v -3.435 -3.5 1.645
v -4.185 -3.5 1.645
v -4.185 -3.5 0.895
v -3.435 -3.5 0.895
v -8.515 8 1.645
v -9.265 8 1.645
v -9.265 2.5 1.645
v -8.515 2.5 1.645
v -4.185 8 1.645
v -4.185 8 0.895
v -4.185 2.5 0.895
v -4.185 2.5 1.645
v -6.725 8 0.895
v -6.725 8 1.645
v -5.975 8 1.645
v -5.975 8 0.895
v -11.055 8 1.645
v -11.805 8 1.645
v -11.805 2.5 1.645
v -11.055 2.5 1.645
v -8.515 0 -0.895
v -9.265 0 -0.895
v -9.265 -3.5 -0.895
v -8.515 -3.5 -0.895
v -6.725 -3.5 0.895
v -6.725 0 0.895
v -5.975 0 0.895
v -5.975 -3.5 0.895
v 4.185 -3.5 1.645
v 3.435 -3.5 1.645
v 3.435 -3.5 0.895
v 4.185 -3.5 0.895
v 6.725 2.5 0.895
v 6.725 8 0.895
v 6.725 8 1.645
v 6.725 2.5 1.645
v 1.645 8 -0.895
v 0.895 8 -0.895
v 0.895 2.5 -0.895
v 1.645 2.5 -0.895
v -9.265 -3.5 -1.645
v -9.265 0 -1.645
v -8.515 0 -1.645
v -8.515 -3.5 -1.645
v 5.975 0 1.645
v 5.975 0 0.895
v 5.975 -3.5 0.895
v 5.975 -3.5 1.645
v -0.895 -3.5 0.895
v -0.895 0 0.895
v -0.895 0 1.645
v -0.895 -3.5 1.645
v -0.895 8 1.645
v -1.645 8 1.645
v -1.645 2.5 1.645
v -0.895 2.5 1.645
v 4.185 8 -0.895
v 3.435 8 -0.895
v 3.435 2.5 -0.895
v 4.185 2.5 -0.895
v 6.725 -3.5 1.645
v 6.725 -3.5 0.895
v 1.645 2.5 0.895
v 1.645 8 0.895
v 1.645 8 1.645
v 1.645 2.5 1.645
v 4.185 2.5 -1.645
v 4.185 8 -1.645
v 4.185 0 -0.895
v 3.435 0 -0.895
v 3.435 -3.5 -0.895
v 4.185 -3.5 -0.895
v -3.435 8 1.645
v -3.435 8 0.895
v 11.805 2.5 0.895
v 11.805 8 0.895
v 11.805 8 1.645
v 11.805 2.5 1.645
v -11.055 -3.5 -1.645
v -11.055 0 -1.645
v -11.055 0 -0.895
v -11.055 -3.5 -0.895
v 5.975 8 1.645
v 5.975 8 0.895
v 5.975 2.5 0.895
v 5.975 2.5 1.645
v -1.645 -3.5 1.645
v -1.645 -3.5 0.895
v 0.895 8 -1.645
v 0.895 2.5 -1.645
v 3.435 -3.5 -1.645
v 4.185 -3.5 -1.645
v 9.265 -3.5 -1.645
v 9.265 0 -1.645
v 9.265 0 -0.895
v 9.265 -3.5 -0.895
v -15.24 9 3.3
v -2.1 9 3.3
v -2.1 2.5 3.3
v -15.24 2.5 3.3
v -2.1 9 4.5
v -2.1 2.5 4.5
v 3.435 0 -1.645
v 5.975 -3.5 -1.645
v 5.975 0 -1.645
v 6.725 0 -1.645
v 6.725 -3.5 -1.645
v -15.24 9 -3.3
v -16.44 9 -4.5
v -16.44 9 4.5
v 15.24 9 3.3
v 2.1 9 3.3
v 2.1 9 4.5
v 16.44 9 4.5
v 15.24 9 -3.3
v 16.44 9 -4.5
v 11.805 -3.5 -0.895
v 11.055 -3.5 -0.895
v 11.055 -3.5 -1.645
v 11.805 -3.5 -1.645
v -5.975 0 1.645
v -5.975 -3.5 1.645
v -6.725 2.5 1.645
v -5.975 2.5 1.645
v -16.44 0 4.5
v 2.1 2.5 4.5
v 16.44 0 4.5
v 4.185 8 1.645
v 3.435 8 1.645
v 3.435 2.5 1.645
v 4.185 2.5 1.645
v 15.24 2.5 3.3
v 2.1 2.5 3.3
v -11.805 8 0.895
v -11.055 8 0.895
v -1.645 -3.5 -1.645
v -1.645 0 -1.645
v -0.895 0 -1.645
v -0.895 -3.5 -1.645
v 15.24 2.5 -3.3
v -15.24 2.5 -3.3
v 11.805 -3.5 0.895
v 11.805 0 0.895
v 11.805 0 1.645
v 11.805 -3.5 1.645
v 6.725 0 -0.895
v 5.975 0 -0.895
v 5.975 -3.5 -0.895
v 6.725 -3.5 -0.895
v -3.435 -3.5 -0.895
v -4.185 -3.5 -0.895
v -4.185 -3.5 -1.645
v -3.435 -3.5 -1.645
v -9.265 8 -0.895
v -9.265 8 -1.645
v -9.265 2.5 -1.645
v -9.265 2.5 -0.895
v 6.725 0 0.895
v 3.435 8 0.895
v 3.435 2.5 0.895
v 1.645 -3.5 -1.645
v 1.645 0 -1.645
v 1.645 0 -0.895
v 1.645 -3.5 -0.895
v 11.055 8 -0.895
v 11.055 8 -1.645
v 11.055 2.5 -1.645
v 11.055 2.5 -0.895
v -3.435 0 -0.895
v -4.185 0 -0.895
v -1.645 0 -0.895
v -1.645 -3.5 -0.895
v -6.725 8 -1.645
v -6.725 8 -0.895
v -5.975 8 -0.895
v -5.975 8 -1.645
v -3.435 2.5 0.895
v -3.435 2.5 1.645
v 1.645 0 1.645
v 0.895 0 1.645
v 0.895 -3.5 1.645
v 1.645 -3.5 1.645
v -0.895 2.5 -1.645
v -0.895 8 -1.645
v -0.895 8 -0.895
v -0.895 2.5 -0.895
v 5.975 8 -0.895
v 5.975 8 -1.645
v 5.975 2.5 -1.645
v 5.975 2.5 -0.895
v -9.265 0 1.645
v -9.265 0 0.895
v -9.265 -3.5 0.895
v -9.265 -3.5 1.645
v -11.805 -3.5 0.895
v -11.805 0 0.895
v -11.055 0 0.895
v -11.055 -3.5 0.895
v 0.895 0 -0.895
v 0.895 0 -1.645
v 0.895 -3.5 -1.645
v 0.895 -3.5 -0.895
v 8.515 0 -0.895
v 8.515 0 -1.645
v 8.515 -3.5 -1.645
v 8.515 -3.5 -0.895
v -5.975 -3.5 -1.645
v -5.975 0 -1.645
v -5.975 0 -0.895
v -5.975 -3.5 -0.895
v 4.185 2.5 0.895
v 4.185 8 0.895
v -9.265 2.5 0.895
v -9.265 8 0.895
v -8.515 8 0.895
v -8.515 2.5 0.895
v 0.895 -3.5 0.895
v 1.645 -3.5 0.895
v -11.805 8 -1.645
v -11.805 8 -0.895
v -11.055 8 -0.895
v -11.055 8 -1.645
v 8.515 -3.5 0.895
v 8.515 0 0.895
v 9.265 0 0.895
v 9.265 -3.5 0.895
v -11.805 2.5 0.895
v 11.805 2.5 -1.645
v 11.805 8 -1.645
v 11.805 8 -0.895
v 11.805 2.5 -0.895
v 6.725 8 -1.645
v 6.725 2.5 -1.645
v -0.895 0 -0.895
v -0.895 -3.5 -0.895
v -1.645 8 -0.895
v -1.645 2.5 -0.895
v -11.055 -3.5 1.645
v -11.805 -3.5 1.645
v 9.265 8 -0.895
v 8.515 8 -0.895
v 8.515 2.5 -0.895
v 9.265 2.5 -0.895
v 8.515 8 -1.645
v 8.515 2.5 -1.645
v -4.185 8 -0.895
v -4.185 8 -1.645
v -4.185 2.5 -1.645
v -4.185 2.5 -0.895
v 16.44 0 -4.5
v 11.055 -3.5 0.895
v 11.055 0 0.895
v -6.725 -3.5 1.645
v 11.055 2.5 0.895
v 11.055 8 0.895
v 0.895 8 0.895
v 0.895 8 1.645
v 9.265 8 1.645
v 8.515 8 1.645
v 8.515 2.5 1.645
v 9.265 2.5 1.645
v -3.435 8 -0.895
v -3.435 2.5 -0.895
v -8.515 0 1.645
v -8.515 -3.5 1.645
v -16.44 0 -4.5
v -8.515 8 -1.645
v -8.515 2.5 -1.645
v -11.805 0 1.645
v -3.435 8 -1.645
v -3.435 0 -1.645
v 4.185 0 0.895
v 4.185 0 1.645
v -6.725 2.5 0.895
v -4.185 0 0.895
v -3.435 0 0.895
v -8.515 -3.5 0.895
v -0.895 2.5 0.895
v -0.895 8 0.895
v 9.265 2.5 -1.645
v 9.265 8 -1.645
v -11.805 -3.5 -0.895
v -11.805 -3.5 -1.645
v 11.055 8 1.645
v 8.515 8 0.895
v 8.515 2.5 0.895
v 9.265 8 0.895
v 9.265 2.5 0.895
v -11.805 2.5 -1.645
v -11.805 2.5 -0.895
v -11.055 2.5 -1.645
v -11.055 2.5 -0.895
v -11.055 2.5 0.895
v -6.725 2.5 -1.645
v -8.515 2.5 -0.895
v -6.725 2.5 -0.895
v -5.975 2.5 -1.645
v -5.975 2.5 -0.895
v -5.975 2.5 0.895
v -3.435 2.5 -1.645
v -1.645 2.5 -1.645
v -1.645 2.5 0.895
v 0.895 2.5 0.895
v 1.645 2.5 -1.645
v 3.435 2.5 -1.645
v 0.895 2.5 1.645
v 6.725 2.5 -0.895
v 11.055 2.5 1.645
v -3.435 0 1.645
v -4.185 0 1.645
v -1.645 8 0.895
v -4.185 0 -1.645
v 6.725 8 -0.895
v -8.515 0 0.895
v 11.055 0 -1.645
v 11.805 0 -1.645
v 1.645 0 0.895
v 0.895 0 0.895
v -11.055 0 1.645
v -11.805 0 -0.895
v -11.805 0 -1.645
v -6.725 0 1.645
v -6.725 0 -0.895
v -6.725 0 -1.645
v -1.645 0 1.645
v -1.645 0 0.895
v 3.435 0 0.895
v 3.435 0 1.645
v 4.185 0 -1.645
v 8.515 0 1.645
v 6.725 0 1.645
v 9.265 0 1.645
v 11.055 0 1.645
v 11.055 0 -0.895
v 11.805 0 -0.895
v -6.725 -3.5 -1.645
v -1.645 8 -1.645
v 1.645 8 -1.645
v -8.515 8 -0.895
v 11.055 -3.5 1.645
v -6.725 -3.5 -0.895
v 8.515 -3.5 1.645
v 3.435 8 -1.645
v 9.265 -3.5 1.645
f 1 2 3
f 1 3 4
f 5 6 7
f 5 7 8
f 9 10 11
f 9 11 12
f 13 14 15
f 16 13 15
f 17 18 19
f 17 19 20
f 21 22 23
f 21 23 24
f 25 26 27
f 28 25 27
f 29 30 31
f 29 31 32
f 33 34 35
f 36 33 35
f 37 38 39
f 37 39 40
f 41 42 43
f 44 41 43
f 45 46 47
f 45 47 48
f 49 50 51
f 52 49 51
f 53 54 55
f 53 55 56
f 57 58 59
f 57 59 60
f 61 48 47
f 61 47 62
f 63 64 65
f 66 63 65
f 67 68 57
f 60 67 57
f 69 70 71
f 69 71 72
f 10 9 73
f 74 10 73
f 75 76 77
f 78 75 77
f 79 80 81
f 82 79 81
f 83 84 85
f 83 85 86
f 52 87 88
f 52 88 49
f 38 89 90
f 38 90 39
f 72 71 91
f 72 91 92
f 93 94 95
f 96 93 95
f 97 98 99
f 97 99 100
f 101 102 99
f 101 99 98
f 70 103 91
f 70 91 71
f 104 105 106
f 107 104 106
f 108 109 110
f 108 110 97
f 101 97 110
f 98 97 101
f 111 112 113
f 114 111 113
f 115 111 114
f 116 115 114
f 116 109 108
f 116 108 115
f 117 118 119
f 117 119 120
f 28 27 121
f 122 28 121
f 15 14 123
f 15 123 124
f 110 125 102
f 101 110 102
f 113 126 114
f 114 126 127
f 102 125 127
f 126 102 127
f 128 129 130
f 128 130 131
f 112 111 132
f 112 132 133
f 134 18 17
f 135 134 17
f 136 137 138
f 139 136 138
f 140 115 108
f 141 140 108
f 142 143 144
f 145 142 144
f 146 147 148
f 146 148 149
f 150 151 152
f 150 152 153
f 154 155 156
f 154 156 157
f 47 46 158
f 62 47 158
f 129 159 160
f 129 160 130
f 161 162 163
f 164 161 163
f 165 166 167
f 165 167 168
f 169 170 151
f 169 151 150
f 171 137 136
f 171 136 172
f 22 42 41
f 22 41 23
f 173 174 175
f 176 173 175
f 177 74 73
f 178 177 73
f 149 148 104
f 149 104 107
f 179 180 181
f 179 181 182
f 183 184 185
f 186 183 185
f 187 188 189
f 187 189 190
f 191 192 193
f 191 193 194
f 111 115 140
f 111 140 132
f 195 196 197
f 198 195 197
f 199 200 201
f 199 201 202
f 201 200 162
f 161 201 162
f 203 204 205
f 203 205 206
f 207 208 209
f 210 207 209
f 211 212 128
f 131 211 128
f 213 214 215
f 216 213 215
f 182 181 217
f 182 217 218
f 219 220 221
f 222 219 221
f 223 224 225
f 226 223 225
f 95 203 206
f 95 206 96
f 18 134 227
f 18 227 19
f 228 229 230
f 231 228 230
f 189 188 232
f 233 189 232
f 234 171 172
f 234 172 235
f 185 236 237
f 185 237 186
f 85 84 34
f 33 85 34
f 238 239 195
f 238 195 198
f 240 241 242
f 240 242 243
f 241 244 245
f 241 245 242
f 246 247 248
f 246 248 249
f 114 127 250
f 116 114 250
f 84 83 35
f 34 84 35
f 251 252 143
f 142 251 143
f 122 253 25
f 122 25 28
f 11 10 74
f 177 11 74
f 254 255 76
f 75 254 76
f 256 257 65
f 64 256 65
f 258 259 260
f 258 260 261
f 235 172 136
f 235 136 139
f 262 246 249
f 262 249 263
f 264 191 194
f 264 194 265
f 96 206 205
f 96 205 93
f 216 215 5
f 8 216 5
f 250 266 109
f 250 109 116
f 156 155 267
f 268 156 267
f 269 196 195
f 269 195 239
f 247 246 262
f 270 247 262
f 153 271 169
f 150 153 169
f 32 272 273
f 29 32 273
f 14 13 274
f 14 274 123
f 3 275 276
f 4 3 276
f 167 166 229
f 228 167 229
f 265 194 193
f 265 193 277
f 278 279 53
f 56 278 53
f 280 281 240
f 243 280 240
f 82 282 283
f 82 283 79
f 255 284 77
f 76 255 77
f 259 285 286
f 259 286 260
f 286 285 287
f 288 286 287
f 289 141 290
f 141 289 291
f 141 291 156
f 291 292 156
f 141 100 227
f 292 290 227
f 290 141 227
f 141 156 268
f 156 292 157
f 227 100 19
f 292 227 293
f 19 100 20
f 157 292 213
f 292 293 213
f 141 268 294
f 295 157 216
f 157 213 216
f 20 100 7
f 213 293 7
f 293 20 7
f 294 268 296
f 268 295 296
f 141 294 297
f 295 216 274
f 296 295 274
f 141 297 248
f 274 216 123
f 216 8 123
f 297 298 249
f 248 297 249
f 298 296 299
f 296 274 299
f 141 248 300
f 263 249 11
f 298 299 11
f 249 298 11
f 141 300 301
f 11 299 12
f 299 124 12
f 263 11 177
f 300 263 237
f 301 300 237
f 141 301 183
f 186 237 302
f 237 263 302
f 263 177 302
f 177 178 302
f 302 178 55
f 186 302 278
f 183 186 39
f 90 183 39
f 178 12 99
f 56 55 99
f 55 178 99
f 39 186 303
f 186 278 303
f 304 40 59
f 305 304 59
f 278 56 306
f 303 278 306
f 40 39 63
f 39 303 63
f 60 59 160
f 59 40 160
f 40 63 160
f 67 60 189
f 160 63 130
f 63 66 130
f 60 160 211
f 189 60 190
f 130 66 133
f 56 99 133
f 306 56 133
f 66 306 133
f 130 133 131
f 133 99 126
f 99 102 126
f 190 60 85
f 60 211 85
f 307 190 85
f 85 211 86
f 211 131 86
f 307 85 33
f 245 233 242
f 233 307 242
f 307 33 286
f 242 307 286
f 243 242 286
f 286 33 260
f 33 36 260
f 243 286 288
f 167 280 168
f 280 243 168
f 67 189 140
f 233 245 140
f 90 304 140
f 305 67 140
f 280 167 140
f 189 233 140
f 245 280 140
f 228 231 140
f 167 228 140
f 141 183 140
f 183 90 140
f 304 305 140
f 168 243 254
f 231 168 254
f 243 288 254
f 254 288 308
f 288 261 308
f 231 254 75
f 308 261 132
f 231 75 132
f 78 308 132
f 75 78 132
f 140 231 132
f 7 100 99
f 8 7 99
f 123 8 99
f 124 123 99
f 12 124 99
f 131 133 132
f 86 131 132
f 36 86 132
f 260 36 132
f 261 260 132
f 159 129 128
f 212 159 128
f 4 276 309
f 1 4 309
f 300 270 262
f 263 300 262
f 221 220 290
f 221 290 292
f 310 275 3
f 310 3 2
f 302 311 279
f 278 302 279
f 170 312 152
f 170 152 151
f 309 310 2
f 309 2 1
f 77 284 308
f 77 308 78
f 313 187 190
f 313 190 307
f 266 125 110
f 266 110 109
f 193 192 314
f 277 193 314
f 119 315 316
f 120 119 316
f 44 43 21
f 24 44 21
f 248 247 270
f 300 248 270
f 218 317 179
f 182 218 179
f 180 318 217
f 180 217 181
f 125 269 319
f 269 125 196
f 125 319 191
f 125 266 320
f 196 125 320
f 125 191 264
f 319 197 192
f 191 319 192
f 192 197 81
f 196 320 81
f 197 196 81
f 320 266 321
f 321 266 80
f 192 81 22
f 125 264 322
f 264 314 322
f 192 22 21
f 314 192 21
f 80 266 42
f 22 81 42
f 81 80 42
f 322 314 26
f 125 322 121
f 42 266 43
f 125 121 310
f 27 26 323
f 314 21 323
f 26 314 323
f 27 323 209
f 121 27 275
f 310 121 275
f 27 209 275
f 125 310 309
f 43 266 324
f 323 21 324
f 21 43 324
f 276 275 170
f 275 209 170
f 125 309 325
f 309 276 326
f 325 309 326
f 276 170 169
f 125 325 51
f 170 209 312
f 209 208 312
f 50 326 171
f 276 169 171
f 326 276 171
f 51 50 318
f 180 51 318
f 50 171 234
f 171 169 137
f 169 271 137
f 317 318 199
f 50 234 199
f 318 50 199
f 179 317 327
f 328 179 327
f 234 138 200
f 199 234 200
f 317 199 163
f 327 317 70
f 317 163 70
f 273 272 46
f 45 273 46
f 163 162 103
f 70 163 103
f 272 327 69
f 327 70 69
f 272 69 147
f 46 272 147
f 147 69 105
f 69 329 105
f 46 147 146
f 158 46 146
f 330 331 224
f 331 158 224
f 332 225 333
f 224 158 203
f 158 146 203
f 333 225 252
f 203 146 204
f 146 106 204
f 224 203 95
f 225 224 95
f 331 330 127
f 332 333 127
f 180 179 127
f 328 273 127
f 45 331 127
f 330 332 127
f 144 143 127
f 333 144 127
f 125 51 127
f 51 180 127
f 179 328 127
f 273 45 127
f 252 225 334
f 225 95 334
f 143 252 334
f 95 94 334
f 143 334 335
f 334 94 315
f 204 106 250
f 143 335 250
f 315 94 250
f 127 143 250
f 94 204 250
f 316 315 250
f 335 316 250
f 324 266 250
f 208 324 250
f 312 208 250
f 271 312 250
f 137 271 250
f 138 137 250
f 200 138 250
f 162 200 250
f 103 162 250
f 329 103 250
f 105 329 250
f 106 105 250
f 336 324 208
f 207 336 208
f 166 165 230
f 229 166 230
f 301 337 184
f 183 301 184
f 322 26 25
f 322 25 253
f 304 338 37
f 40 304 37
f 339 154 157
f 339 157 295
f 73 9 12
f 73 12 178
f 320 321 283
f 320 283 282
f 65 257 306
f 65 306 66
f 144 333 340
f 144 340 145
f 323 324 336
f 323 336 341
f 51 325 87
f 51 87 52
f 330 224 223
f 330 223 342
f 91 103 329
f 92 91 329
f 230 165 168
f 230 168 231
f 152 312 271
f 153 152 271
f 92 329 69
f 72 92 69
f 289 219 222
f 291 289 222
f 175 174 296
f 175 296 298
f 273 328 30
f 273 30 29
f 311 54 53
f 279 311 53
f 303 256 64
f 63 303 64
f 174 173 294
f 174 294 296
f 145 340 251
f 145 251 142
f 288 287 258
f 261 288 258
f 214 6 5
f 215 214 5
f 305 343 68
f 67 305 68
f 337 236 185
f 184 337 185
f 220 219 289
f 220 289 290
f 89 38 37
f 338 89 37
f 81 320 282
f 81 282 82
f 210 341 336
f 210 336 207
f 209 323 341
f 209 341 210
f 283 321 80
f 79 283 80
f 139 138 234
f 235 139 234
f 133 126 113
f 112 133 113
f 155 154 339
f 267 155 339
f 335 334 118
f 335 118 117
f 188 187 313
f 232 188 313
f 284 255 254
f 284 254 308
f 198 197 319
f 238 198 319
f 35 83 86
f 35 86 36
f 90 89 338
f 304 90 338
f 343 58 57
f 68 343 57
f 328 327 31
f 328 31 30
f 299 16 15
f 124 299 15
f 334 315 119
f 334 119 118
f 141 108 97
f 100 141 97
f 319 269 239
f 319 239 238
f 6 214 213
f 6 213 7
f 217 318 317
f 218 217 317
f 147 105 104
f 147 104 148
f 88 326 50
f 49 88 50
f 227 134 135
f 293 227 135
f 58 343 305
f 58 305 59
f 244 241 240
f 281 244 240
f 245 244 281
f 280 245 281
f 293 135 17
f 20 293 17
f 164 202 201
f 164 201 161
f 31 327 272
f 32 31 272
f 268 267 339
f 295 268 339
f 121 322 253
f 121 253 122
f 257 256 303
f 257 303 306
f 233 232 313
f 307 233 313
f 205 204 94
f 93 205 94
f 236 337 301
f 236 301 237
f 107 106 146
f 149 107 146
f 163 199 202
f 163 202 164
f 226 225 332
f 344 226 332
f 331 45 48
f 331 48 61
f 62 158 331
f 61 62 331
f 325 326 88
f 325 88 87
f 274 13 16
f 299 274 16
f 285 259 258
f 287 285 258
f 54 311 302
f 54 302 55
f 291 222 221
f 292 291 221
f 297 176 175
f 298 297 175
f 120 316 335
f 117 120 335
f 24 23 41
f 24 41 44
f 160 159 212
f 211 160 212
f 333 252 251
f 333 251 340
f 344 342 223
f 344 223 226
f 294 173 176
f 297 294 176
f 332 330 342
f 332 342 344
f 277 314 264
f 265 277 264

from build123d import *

# Parameters (mm, degrees)
SKETCH_1_W           = 32.88
SKETCH_1_H           = 9
EXTRUDE_1_DEPTH      = 9
SKETCH_2_W           = 30.48
SKETCH_2_H           = 6.6
CUT_EXTRUDE_1_DEPTH  = 6.5
SKETCH_3_W           = 4.2
SKETCH_3_H           = 6.5
CUT_EXTRUDE_2_DEPTH  = 6.5
EXTRUDE_2_DEPTH      = 3.5
EXTRUDE_2_DEPTH_BACK = 8
SKETCH_5_W           = 0.75
SKETCH_5_H           = 0.75


with BuildPart() as part:
    # 草图1 → 拉伸1 (new body)
    with BuildSketch(Plane(origin=(0, 0, 0), x_dir=(1, 0, 0), z_dir=(0, 1, 0))):
        Rectangle(SKETCH_1_W, SKETCH_1_H)
    extrude(amount=EXTRUDE_1_DEPTH)

    # 草图2 → 切除-拉伸1 (cut)
    with BuildSketch(Plane(origin=(0, 9, 0), x_dir=(-1, 0, 0), z_dir=(0, 1, 0))):
        Rectangle(SKETCH_2_W, SKETCH_2_H)
    extrude(amount=-CUT_EXTRUDE_1_DEPTH, mode=Mode.SUBTRACT)

    # 草图3 → 切除-拉伸2 (cut)
    with BuildSketch(Plane.XY.offset(4.5)):
        with Locations((0, 5.75)):
            Rectangle(SKETCH_3_W, SKETCH_3_H)
    extrude(amount=-CUT_EXTRUDE_2_DEPTH, mode=Mode.SUBTRACT)

    # 草图5 → 拉伸2 (add, two sides: drawn at the far end of the back side and taken through both)
    with BuildSketch(Plane.XZ.offset(-EXTRUDE_2_DEPTH_BACK)):
        with Locations((-1.27, 1.27)):
            Rectangle(SKETCH_5_W, SKETCH_5_H)
        with Locations((1.27, 1.27)):
            Rectangle(SKETCH_5_W, SKETCH_5_H)
        with Locations((3.81, 1.27)):
            Rectangle(SKETCH_5_W, SKETCH_5_H)
        with Locations((6.35, 1.27)):
            Rectangle(SKETCH_5_W, SKETCH_5_H)
        with Locations((8.89, 1.27)):
            Rectangle(SKETCH_5_W, SKETCH_5_H)
        with Locations((11.43, 1.27)):
            Rectangle(SKETCH_5_W, SKETCH_5_H)
        with Locations((1.27, -1.27)):
            Rectangle(SKETCH_5_W, SKETCH_5_H)
        with Locations((3.81, -1.27)):
            Rectangle(SKETCH_5_W, SKETCH_5_H)
        with Locations((6.35, -1.27)):
            Rectangle(SKETCH_5_W, SKETCH_5_H)
        with Locations((8.89, -1.27)):
            Rectangle(SKETCH_5_W, SKETCH_5_H)
        with Locations((11.43, -1.27)):
            Rectangle(SKETCH_5_W, SKETCH_5_H)
        with Locations((-3.81, 1.27)):
            Rectangle(SKETCH_5_W, SKETCH_5_H)
        with Locations((-6.35, 1.27)):
            Rectangle(SKETCH_5_W, SKETCH_5_H)
        with Locations((-8.89, 1.27)):
            Rectangle(SKETCH_5_W, SKETCH_5_H)
        with Locations((-11.43, 1.27)):
            Rectangle(SKETCH_5_W, SKETCH_5_H)
        with Locations((-1.27, -1.27)):
            Rectangle(SKETCH_5_W, SKETCH_5_H)
        with Locations((-3.81, -1.27)):
            Rectangle(SKETCH_5_W, SKETCH_5_H)
        with Locations((-6.35, -1.27)):
            Rectangle(SKETCH_5_W, SKETCH_5_H)
        with Locations((-8.89, -1.27)):
            Rectangle(SKETCH_5_W, SKETCH_5_H)
        with Locations((-11.43, -1.27)):
            Rectangle(SKETCH_5_W, SKETCH_5_H)
    extrude(amount=EXTRUDE_2_DEPTH + EXTRUDE_2_DEPTH_BACK)


solid = part.part
